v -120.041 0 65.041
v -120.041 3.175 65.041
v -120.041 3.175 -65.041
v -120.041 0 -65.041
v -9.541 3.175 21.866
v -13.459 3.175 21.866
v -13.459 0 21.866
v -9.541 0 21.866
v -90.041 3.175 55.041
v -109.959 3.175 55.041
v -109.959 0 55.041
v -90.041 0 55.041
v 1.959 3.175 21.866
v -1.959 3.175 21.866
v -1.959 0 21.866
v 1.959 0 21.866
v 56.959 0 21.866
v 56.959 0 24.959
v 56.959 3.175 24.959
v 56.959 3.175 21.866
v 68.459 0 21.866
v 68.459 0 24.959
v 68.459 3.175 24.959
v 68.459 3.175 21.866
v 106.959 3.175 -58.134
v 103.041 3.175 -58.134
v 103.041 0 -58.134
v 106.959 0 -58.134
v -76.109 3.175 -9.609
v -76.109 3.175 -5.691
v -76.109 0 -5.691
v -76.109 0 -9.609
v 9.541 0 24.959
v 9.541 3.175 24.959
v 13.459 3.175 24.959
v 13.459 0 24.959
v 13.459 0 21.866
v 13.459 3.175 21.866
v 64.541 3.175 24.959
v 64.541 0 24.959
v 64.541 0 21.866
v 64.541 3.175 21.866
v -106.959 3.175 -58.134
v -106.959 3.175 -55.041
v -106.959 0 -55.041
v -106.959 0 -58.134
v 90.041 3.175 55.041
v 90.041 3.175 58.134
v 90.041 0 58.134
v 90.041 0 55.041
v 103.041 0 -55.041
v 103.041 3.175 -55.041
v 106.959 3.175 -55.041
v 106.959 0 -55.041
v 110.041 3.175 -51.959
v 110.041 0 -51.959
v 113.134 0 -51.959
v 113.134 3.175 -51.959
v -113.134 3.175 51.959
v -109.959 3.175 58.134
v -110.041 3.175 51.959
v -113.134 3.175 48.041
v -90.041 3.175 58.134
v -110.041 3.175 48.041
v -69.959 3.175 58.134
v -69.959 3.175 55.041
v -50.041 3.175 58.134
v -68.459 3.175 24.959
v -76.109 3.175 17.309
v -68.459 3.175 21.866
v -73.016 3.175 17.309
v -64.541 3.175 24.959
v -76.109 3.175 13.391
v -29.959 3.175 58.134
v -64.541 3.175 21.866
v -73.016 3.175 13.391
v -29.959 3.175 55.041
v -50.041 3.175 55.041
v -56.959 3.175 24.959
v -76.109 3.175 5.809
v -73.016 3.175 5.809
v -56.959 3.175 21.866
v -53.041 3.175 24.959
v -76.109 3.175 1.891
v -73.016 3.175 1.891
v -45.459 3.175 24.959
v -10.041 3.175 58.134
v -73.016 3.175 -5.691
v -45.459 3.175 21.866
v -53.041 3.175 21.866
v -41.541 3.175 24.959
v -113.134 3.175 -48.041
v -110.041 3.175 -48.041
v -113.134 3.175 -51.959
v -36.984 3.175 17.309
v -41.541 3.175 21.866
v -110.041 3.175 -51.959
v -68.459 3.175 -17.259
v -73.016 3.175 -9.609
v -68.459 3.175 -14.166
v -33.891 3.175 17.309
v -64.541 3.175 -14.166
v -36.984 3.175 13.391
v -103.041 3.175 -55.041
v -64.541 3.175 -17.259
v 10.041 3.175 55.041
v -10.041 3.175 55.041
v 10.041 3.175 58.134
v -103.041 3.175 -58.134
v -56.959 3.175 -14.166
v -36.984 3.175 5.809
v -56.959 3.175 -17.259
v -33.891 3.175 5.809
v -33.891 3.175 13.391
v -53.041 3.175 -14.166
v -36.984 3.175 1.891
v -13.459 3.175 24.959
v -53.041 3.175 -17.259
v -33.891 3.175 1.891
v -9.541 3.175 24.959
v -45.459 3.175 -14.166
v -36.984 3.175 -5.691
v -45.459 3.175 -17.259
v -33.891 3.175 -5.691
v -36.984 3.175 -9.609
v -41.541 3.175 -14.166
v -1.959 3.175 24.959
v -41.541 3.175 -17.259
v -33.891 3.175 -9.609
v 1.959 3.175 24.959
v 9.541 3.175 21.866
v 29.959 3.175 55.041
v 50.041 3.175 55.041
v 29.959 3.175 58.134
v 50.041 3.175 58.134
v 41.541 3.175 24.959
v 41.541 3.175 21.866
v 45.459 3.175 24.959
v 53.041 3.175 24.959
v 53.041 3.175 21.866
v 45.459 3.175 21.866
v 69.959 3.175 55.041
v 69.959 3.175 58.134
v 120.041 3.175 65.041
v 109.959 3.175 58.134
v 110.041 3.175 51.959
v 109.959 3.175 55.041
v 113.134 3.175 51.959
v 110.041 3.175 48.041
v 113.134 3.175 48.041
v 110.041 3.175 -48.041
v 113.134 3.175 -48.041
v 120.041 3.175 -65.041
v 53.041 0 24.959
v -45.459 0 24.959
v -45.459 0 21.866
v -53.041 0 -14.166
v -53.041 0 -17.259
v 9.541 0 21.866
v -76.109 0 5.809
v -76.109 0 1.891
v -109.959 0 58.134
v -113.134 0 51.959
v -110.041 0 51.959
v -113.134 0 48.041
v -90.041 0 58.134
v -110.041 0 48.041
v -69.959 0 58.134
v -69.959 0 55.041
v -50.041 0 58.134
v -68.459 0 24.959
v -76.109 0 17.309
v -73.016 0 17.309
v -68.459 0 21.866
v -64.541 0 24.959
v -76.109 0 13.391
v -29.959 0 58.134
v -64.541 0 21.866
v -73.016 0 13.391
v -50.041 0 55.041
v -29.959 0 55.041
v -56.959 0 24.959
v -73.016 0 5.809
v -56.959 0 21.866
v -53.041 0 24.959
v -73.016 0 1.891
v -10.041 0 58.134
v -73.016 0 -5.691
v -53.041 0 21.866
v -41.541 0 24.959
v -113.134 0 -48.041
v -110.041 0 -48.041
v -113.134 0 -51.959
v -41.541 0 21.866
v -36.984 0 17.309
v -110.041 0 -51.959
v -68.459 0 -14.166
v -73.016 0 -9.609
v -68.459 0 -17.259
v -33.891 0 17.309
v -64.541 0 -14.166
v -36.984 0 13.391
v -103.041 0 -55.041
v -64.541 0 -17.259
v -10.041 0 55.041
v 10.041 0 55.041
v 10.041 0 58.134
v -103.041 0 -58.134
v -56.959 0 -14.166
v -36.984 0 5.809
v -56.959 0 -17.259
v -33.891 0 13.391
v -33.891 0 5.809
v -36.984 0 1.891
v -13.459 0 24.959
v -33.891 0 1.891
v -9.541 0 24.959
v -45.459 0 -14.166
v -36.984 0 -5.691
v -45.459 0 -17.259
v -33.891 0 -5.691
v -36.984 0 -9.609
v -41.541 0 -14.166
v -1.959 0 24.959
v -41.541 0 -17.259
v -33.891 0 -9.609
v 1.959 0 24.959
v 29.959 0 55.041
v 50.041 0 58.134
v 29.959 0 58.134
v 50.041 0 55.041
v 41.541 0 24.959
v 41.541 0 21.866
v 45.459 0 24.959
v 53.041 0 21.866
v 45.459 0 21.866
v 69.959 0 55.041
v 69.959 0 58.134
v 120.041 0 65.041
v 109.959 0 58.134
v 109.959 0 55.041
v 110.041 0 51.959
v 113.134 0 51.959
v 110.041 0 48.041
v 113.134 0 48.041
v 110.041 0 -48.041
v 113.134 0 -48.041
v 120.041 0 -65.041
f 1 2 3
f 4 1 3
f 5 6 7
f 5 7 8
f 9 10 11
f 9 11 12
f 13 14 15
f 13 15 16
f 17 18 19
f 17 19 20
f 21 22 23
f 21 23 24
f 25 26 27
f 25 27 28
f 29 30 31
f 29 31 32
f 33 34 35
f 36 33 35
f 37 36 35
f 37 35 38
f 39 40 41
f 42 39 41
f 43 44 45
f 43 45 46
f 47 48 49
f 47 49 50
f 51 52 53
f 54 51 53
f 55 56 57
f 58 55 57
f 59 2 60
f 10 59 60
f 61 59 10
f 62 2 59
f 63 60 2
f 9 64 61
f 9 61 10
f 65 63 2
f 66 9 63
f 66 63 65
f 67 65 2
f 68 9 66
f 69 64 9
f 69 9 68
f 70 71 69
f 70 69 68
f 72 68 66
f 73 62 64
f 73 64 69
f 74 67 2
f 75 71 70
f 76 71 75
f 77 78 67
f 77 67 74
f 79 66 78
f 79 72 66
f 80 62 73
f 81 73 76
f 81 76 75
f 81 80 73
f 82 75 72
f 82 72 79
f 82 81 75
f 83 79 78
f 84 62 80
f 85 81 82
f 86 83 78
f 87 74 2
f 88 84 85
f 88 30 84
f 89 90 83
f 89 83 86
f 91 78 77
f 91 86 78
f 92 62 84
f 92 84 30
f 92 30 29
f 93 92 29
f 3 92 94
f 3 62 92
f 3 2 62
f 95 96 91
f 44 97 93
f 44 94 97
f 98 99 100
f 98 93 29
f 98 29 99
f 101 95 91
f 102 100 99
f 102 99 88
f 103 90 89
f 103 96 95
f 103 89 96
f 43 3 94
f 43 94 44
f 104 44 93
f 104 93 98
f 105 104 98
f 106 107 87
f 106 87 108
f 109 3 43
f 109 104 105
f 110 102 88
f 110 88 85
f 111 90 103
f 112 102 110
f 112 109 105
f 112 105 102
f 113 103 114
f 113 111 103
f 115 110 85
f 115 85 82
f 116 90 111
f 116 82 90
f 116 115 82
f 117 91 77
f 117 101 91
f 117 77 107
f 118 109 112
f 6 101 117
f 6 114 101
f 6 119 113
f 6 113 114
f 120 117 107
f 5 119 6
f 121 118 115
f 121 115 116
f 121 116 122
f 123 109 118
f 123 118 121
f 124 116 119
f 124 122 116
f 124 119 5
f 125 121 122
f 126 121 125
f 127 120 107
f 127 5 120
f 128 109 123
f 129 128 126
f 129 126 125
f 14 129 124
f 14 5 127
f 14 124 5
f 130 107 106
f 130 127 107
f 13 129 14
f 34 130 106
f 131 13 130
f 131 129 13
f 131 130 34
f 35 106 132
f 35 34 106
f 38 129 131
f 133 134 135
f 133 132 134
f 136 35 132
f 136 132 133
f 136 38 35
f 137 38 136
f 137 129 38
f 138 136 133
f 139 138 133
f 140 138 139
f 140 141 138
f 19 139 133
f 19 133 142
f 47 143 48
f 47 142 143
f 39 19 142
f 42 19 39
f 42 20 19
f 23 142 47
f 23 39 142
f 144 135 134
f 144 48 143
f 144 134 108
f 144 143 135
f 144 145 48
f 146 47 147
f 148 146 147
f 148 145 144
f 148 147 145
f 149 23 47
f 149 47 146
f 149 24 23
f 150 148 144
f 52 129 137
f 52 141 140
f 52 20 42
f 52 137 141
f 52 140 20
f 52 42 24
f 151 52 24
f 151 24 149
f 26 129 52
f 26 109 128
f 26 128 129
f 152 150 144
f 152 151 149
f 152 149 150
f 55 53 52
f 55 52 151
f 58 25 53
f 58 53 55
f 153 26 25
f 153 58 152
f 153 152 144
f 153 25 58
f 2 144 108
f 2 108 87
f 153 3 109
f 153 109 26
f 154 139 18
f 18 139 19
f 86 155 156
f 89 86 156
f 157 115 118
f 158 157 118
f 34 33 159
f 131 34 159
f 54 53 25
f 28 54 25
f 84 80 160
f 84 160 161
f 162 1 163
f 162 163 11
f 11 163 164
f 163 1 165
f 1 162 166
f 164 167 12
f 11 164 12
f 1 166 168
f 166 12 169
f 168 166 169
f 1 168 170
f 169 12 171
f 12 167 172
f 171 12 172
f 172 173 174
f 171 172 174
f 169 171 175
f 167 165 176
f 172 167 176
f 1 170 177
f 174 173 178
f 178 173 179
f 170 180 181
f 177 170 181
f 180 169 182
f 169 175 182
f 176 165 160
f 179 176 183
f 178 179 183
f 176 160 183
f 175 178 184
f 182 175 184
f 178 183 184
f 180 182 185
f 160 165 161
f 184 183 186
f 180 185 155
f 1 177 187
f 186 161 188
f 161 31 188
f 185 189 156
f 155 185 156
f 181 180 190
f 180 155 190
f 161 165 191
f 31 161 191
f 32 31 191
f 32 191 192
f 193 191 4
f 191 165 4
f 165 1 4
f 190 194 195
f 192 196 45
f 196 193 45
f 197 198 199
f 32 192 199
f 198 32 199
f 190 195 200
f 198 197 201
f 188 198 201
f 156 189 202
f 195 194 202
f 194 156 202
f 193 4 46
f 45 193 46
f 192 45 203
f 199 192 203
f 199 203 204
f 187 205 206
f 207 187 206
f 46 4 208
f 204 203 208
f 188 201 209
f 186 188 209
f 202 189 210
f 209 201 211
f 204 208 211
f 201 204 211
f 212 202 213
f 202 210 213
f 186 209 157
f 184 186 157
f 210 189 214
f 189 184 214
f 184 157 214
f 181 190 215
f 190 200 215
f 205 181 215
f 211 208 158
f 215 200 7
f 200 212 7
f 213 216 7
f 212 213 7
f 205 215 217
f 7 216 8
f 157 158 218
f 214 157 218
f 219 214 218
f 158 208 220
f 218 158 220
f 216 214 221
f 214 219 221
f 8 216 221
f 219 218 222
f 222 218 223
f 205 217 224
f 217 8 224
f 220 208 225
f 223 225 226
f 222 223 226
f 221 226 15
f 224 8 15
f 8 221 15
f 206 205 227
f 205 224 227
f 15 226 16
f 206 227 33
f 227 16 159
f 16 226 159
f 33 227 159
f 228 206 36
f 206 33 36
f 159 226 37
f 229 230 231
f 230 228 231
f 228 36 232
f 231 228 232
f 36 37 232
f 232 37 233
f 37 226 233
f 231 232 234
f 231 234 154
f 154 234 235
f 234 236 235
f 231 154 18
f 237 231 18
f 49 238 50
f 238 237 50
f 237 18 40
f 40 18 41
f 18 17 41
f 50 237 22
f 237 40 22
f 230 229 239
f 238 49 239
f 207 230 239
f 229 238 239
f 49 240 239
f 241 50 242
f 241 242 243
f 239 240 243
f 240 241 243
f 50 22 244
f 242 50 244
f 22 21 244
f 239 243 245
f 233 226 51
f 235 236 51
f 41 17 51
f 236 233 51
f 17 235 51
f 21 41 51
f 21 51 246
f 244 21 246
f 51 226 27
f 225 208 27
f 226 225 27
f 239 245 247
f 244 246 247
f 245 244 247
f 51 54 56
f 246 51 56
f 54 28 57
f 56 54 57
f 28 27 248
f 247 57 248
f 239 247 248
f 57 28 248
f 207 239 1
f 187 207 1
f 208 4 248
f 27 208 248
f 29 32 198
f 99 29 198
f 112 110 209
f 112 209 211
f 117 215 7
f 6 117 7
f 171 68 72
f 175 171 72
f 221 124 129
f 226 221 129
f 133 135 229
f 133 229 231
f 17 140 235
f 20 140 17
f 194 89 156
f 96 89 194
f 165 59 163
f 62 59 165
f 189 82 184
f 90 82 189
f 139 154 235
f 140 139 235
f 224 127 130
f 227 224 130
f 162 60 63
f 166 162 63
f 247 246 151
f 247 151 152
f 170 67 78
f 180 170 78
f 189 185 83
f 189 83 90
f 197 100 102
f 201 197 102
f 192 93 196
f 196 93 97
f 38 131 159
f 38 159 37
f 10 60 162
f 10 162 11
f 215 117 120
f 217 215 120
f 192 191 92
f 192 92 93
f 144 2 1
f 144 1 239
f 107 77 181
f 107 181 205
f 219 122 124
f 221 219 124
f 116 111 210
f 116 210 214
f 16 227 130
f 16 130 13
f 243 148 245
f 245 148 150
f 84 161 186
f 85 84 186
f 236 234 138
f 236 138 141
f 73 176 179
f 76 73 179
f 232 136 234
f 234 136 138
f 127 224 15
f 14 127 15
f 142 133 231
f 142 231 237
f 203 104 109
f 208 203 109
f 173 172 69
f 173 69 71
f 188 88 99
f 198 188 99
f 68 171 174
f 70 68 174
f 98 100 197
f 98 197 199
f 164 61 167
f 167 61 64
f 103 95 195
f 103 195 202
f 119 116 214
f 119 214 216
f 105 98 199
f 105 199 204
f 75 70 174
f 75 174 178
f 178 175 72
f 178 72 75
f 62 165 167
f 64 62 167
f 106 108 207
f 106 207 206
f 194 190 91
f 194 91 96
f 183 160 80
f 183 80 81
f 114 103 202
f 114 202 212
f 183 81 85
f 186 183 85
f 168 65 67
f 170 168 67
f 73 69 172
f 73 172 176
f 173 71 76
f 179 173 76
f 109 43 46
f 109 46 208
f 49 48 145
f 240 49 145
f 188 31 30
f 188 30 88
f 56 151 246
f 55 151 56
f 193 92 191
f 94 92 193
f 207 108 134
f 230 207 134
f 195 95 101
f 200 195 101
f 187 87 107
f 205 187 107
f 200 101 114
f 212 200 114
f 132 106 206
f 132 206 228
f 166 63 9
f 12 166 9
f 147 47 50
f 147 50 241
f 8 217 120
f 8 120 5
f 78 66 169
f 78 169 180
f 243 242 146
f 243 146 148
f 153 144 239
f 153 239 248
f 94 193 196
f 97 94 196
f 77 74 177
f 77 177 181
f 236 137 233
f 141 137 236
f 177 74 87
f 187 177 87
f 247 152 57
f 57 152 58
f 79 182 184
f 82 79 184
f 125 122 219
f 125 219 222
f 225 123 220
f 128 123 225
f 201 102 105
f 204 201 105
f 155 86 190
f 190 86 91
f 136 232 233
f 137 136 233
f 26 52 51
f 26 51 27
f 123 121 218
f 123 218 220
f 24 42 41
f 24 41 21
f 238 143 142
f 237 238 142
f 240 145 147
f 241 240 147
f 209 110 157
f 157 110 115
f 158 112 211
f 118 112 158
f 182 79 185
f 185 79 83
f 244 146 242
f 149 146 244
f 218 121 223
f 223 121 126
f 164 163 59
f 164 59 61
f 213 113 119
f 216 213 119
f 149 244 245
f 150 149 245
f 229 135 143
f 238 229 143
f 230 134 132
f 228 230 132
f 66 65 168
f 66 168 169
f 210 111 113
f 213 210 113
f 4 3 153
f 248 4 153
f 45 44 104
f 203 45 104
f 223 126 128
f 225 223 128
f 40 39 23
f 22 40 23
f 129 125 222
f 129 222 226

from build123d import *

# Parameters (mm, degrees)
SKETCH1_W           = 240
SKETCH1_H           = 130
SKETCH1_W_2         = 3.175
SKETCH1_H_2         = 4
SKETCH1_W_3         = 20
SKETCH1_H_3         = 3.175
SKETCH1_W_4         = 4
BOSS_EXTRUDE1_DEPTH = 3.175
SKETCH2_W           = 240.08128
SKETCH2_H           = 130.08128
SKETCH2_W_2         = 3.91872
SKETCH2_H_2         = 3.09372
SKETCH2_W_3         = 3.09372
SKETCH2_H_3         = 3.91872
SKETCH2_W_4         = 19.91872
BOSS_EXTRUDE2_DEPTH = 3.175


with BuildPart() as part:
    # Sketch1 → Boss-Extrude1 (new body)
    with BuildSketch(Plane(origin=(0, 0, 0), x_dir=(1, 0, 0), z_dir=(0, 1, 0))):
        Rectangle(SKETCH1_W, SKETCH1_H)
        with Locations((-111.5875, -50)):
            Rectangle(SKETCH1_W_2, SKETCH1_H_2, mode=Mode.SUBTRACT)
        with Locations((-100, -56.5875)):
            Rectangle(SKETCH1_W_3, SKETCH1_H_3, mode=Mode.SUBTRACT)
        with Locations((-60, -56.5875)):
            Rectangle(SKETCH1_W_3, SKETCH1_H_3, mode=Mode.SUBTRACT)
        with Locations((-20, -56.5875)):
            Rectangle(SKETCH1_W_3, SKETCH1_H_3, mode=Mode.SUBTRACT)
        with Locations((-11.5, -23.4125)):
            Rectangle(SKETCH1_W_4, SKETCH1_H_3, mode=Mode.SUBTRACT)
        with Locations((-66.5, -23.4125)):
            Rectangle(SKETCH1_W_4, SKETCH1_H_3, mode=Mode.SUBTRACT)
        with Locations((-55, -23.4125)):
            Rectangle(SKETCH1_W_4, SKETCH1_H_3, mode=Mode.SUBTRACT)
        with Locations((-43.5, -23.4125)):
            Rectangle(SKETCH1_W_4, SKETCH1_H_3, mode=Mode.SUBTRACT)
        with Locations((-35.4375, -15.35)):
            Rectangle(SKETCH1_W_2, SKETCH1_H_2, mode=Mode.SUBTRACT)
        with Locations((-35.4375, -3.85)):
            Rectangle(SKETCH1_W_2, SKETCH1_H_2, mode=Mode.SUBTRACT)
        with Locations((-35.4375, 7.65)):
            Rectangle(SKETCH1_W_2, SKETCH1_H_2, mode=Mode.SUBTRACT)
        with Locations((-43.5, 15.7125)):
            Rectangle(SKETCH1_W_4, SKETCH1_H_3, mode=Mode.SUBTRACT)
        with Locations((-55, 15.7125)):
            Rectangle(SKETCH1_W_4, SKETCH1_H_3, mode=Mode.SUBTRACT)
        with Locations((-66.5, 15.7125)):
            Rectangle(SKETCH1_W_4, SKETCH1_H_3, mode=Mode.SUBTRACT)
        with Locations((-74.5625, 7.65)):
            Rectangle(SKETCH1_W_2, SKETCH1_H_2, mode=Mode.SUBTRACT)
        with Locations((-74.5625, -3.85)):
            Rectangle(SKETCH1_W_2, SKETCH1_H_2, mode=Mode.SUBTRACT)
        with Locations((-74.5625, -15.35)):
            Rectangle(SKETCH1_W_2, SKETCH1_H_2, mode=Mode.SUBTRACT)
        with Locations((20, -56.5875)):
            Rectangle(SKETCH1_W_3, SKETCH1_H_3, mode=Mode.SUBTRACT)
        with Locations((60, -56.5875)):
            Rectangle(SKETCH1_W_3, SKETCH1_H_3, mode=Mode.SUBTRACT)
        with Locations((100, -56.5875)):
            Rectangle(SKETCH1_W_3, SKETCH1_H_3, mode=Mode.SUBTRACT)
        with Locations((111.5875, -50)):
            Rectangle(SKETCH1_W_2, SKETCH1_H_2, mode=Mode.SUBTRACT)
        with Locations((0, -23.4125)):
            Rectangle(SKETCH1_W_4, SKETCH1_H_3, mode=Mode.SUBTRACT)
        with Locations((11.5, -23.4125)):
            Rectangle(SKETCH1_W_4, SKETCH1_H_3, mode=Mode.SUBTRACT)
        with Locations((43.5, -23.4125)):
            Rectangle(SKETCH1_W_4, SKETCH1_H_3, mode=Mode.SUBTRACT)
        with Locations((55, -23.4125)):
            Rectangle(SKETCH1_W_4, SKETCH1_H_3, mode=Mode.SUBTRACT)
        with Locations((66.5, -23.4125)):
            Rectangle(SKETCH1_W_4, SKETCH1_H_3, mode=Mode.SUBTRACT)
        with Locations((-111.5875, 50)):
            Rectangle(SKETCH1_W_2, SKETCH1_H_2, mode=Mode.SUBTRACT)
        with Locations((-105, 56.5875)):
            Rectangle(SKETCH1_W_4, SKETCH1_H_3, mode=Mode.SUBTRACT)
        with Locations((105, 56.5875)):
            Rectangle(SKETCH1_W_4, SKETCH1_H_3, mode=Mode.SUBTRACT)
        with Locations((111.5875, 50)):
            Rectangle(SKETCH1_W_2, SKETCH1_H_2, mode=Mode.SUBTRACT)
    extrude(amount=BOSS_EXTRUDE1_DEPTH)

    # Sketch2 → Boss-Extrude2 (add)
    with BuildSketch(Plane(origin=(0, 3.175, 0), x_dir=(1, 0, 0), z_dir=(0, 1, 0))):
        Rectangle(SKETCH2_W, SKETCH2_H)
        with Locations((-105, 56.5875)):
            Rectangle(SKETCH2_W_2, SKETCH2_H_2, mode=Mode.SUBTRACT)
        with Locations((-74.5625, -3.85)):
            Rectangle(SKETCH2_W_3, SKETCH2_H_3, mode=Mode.SUBTRACT)
        with Locations((-35.4375, 7.65)):
            Rectangle(SKETCH2_W_3, SKETCH2_H_3, mode=Mode.SUBTRACT)
        with Locations((-111.5875, 50)):
            Rectangle(SKETCH2_W_3, SKETCH2_H_3, mode=Mode.SUBTRACT)
        with Locations((-74.5625, -15.35)):
            Rectangle(SKETCH2_W_3, SKETCH2_H_3, mode=Mode.SUBTRACT)
        with Locations((105, 56.5875)):
            Rectangle(SKETCH2_W_2, SKETCH2_H_2, mode=Mode.SUBTRACT)
        with Locations((-11.5, -23.4125)):
            Rectangle(SKETCH2_W_2, SKETCH2_H_2, mode=Mode.SUBTRACT)
        with Locations((111.5875, 50)):
            Rectangle(SKETCH2_W_3, SKETCH2_H_3, mode=Mode.SUBTRACT)
        with Locations((-66.5, 15.7125)):
            Rectangle(SKETCH2_W_2, SKETCH2_H_2, mode=Mode.SUBTRACT)
        with Locations((-35.4375, -3.85)):
            Rectangle(SKETCH2_W_3, SKETCH2_H_3, mode=Mode.SUBTRACT)
        with Locations((-111.5875, -50)):
            Rectangle(SKETCH2_W_3, SKETCH2_H_3, mode=Mode.SUBTRACT)
        with Locations((-55, 15.7125)):
            Rectangle(SKETCH2_W_2, SKETCH2_H_2, mode=Mode.SUBTRACT)
        with Locations((-100, -56.5875)):
            Rectangle(SKETCH2_W_4, SKETCH2_H_2, mode=Mode.SUBTRACT)
        with Locations((-35.4375, -15.35)):
            Rectangle(SKETCH2_W_3, SKETCH2_H_3, mode=Mode.SUBTRACT)
        with Locations((-60, -56.5875)):
            Rectangle(SKETCH2_W_4, SKETCH2_H_2, mode=Mode.SUBTRACT)
        with Locations((-43.5, 15.7125)):
            Rectangle(SKETCH2_W_2, SKETCH2_H_2, mode=Mode.SUBTRACT)
        with Locations((-20, -56.5875)):
            Rectangle(SKETCH2_W_4, SKETCH2_H_2, mode=Mode.SUBTRACT)
        with Locations((0, -23.4125)):
            Rectangle(SKETCH2_W_2, SKETCH2_H_2, mode=Mode.SUBTRACT)
        with Locations((20, -56.5875)):
            Rectangle(SKETCH2_W_4, SKETCH2_H_2, mode=Mode.SUBTRACT)
        with Locations((-66.5, -23.4125)):
            Rectangle(SKETCH2_W_2, SKETCH2_H_2, mode=Mode.SUBTRACT)
        with Locations((60, -56.5875)):
            Rectangle(SKETCH2_W_4, SKETCH2_H_2, mode=Mode.SUBTRACT)
        with Locations((-55, -23.4125)):
            Rectangle(SKETCH2_W_2, SKETCH2_H_2, mode=Mode.SUBTRACT)
        with Locations((100, -56.5875)):
            Rectangle(SKETCH2_W_4, SKETCH2_H_2, mode=Mode.SUBTRACT)
        with Locations((11.5, -23.4125)):
            Rectangle(SKETCH2_W_2, SKETCH2_H_2, mode=Mode.SUBTRACT)
        with Locations((-43.5, -23.4125)):
            Rectangle(SKETCH2_W_2, SKETCH2_H_2, mode=Mode.SUBTRACT)
        with Locations((111.5875, -50)):
            Rectangle(SKETCH2_W_3, SKETCH2_H_3, mode=Mode.SUBTRACT)
        with Locations((-74.5625, 7.65)):
            Rectangle(SKETCH2_W_3, SKETCH2_H_3, mode=Mode.SUBTRACT)
        with Locations((43.5, -23.4125)):
            Rectangle(SKETCH2_W_2, SKETCH2_H_2, mode=Mode.SUBTRACT)
        with Locations((55, -23.4125)):
            Rectangle(SKETCH2_W_2, SKETCH2_H_2, mode=Mode.SUBTRACT)
        with Locations((66.5, -23.4125)):
            Rectangle(SKETCH2_W_2, SKETCH2_H_2, mode=Mode.SUBTRACT)
    extrude(amount=-BOSS_EXTRUDE2_DEPTH)


solid = part.part
